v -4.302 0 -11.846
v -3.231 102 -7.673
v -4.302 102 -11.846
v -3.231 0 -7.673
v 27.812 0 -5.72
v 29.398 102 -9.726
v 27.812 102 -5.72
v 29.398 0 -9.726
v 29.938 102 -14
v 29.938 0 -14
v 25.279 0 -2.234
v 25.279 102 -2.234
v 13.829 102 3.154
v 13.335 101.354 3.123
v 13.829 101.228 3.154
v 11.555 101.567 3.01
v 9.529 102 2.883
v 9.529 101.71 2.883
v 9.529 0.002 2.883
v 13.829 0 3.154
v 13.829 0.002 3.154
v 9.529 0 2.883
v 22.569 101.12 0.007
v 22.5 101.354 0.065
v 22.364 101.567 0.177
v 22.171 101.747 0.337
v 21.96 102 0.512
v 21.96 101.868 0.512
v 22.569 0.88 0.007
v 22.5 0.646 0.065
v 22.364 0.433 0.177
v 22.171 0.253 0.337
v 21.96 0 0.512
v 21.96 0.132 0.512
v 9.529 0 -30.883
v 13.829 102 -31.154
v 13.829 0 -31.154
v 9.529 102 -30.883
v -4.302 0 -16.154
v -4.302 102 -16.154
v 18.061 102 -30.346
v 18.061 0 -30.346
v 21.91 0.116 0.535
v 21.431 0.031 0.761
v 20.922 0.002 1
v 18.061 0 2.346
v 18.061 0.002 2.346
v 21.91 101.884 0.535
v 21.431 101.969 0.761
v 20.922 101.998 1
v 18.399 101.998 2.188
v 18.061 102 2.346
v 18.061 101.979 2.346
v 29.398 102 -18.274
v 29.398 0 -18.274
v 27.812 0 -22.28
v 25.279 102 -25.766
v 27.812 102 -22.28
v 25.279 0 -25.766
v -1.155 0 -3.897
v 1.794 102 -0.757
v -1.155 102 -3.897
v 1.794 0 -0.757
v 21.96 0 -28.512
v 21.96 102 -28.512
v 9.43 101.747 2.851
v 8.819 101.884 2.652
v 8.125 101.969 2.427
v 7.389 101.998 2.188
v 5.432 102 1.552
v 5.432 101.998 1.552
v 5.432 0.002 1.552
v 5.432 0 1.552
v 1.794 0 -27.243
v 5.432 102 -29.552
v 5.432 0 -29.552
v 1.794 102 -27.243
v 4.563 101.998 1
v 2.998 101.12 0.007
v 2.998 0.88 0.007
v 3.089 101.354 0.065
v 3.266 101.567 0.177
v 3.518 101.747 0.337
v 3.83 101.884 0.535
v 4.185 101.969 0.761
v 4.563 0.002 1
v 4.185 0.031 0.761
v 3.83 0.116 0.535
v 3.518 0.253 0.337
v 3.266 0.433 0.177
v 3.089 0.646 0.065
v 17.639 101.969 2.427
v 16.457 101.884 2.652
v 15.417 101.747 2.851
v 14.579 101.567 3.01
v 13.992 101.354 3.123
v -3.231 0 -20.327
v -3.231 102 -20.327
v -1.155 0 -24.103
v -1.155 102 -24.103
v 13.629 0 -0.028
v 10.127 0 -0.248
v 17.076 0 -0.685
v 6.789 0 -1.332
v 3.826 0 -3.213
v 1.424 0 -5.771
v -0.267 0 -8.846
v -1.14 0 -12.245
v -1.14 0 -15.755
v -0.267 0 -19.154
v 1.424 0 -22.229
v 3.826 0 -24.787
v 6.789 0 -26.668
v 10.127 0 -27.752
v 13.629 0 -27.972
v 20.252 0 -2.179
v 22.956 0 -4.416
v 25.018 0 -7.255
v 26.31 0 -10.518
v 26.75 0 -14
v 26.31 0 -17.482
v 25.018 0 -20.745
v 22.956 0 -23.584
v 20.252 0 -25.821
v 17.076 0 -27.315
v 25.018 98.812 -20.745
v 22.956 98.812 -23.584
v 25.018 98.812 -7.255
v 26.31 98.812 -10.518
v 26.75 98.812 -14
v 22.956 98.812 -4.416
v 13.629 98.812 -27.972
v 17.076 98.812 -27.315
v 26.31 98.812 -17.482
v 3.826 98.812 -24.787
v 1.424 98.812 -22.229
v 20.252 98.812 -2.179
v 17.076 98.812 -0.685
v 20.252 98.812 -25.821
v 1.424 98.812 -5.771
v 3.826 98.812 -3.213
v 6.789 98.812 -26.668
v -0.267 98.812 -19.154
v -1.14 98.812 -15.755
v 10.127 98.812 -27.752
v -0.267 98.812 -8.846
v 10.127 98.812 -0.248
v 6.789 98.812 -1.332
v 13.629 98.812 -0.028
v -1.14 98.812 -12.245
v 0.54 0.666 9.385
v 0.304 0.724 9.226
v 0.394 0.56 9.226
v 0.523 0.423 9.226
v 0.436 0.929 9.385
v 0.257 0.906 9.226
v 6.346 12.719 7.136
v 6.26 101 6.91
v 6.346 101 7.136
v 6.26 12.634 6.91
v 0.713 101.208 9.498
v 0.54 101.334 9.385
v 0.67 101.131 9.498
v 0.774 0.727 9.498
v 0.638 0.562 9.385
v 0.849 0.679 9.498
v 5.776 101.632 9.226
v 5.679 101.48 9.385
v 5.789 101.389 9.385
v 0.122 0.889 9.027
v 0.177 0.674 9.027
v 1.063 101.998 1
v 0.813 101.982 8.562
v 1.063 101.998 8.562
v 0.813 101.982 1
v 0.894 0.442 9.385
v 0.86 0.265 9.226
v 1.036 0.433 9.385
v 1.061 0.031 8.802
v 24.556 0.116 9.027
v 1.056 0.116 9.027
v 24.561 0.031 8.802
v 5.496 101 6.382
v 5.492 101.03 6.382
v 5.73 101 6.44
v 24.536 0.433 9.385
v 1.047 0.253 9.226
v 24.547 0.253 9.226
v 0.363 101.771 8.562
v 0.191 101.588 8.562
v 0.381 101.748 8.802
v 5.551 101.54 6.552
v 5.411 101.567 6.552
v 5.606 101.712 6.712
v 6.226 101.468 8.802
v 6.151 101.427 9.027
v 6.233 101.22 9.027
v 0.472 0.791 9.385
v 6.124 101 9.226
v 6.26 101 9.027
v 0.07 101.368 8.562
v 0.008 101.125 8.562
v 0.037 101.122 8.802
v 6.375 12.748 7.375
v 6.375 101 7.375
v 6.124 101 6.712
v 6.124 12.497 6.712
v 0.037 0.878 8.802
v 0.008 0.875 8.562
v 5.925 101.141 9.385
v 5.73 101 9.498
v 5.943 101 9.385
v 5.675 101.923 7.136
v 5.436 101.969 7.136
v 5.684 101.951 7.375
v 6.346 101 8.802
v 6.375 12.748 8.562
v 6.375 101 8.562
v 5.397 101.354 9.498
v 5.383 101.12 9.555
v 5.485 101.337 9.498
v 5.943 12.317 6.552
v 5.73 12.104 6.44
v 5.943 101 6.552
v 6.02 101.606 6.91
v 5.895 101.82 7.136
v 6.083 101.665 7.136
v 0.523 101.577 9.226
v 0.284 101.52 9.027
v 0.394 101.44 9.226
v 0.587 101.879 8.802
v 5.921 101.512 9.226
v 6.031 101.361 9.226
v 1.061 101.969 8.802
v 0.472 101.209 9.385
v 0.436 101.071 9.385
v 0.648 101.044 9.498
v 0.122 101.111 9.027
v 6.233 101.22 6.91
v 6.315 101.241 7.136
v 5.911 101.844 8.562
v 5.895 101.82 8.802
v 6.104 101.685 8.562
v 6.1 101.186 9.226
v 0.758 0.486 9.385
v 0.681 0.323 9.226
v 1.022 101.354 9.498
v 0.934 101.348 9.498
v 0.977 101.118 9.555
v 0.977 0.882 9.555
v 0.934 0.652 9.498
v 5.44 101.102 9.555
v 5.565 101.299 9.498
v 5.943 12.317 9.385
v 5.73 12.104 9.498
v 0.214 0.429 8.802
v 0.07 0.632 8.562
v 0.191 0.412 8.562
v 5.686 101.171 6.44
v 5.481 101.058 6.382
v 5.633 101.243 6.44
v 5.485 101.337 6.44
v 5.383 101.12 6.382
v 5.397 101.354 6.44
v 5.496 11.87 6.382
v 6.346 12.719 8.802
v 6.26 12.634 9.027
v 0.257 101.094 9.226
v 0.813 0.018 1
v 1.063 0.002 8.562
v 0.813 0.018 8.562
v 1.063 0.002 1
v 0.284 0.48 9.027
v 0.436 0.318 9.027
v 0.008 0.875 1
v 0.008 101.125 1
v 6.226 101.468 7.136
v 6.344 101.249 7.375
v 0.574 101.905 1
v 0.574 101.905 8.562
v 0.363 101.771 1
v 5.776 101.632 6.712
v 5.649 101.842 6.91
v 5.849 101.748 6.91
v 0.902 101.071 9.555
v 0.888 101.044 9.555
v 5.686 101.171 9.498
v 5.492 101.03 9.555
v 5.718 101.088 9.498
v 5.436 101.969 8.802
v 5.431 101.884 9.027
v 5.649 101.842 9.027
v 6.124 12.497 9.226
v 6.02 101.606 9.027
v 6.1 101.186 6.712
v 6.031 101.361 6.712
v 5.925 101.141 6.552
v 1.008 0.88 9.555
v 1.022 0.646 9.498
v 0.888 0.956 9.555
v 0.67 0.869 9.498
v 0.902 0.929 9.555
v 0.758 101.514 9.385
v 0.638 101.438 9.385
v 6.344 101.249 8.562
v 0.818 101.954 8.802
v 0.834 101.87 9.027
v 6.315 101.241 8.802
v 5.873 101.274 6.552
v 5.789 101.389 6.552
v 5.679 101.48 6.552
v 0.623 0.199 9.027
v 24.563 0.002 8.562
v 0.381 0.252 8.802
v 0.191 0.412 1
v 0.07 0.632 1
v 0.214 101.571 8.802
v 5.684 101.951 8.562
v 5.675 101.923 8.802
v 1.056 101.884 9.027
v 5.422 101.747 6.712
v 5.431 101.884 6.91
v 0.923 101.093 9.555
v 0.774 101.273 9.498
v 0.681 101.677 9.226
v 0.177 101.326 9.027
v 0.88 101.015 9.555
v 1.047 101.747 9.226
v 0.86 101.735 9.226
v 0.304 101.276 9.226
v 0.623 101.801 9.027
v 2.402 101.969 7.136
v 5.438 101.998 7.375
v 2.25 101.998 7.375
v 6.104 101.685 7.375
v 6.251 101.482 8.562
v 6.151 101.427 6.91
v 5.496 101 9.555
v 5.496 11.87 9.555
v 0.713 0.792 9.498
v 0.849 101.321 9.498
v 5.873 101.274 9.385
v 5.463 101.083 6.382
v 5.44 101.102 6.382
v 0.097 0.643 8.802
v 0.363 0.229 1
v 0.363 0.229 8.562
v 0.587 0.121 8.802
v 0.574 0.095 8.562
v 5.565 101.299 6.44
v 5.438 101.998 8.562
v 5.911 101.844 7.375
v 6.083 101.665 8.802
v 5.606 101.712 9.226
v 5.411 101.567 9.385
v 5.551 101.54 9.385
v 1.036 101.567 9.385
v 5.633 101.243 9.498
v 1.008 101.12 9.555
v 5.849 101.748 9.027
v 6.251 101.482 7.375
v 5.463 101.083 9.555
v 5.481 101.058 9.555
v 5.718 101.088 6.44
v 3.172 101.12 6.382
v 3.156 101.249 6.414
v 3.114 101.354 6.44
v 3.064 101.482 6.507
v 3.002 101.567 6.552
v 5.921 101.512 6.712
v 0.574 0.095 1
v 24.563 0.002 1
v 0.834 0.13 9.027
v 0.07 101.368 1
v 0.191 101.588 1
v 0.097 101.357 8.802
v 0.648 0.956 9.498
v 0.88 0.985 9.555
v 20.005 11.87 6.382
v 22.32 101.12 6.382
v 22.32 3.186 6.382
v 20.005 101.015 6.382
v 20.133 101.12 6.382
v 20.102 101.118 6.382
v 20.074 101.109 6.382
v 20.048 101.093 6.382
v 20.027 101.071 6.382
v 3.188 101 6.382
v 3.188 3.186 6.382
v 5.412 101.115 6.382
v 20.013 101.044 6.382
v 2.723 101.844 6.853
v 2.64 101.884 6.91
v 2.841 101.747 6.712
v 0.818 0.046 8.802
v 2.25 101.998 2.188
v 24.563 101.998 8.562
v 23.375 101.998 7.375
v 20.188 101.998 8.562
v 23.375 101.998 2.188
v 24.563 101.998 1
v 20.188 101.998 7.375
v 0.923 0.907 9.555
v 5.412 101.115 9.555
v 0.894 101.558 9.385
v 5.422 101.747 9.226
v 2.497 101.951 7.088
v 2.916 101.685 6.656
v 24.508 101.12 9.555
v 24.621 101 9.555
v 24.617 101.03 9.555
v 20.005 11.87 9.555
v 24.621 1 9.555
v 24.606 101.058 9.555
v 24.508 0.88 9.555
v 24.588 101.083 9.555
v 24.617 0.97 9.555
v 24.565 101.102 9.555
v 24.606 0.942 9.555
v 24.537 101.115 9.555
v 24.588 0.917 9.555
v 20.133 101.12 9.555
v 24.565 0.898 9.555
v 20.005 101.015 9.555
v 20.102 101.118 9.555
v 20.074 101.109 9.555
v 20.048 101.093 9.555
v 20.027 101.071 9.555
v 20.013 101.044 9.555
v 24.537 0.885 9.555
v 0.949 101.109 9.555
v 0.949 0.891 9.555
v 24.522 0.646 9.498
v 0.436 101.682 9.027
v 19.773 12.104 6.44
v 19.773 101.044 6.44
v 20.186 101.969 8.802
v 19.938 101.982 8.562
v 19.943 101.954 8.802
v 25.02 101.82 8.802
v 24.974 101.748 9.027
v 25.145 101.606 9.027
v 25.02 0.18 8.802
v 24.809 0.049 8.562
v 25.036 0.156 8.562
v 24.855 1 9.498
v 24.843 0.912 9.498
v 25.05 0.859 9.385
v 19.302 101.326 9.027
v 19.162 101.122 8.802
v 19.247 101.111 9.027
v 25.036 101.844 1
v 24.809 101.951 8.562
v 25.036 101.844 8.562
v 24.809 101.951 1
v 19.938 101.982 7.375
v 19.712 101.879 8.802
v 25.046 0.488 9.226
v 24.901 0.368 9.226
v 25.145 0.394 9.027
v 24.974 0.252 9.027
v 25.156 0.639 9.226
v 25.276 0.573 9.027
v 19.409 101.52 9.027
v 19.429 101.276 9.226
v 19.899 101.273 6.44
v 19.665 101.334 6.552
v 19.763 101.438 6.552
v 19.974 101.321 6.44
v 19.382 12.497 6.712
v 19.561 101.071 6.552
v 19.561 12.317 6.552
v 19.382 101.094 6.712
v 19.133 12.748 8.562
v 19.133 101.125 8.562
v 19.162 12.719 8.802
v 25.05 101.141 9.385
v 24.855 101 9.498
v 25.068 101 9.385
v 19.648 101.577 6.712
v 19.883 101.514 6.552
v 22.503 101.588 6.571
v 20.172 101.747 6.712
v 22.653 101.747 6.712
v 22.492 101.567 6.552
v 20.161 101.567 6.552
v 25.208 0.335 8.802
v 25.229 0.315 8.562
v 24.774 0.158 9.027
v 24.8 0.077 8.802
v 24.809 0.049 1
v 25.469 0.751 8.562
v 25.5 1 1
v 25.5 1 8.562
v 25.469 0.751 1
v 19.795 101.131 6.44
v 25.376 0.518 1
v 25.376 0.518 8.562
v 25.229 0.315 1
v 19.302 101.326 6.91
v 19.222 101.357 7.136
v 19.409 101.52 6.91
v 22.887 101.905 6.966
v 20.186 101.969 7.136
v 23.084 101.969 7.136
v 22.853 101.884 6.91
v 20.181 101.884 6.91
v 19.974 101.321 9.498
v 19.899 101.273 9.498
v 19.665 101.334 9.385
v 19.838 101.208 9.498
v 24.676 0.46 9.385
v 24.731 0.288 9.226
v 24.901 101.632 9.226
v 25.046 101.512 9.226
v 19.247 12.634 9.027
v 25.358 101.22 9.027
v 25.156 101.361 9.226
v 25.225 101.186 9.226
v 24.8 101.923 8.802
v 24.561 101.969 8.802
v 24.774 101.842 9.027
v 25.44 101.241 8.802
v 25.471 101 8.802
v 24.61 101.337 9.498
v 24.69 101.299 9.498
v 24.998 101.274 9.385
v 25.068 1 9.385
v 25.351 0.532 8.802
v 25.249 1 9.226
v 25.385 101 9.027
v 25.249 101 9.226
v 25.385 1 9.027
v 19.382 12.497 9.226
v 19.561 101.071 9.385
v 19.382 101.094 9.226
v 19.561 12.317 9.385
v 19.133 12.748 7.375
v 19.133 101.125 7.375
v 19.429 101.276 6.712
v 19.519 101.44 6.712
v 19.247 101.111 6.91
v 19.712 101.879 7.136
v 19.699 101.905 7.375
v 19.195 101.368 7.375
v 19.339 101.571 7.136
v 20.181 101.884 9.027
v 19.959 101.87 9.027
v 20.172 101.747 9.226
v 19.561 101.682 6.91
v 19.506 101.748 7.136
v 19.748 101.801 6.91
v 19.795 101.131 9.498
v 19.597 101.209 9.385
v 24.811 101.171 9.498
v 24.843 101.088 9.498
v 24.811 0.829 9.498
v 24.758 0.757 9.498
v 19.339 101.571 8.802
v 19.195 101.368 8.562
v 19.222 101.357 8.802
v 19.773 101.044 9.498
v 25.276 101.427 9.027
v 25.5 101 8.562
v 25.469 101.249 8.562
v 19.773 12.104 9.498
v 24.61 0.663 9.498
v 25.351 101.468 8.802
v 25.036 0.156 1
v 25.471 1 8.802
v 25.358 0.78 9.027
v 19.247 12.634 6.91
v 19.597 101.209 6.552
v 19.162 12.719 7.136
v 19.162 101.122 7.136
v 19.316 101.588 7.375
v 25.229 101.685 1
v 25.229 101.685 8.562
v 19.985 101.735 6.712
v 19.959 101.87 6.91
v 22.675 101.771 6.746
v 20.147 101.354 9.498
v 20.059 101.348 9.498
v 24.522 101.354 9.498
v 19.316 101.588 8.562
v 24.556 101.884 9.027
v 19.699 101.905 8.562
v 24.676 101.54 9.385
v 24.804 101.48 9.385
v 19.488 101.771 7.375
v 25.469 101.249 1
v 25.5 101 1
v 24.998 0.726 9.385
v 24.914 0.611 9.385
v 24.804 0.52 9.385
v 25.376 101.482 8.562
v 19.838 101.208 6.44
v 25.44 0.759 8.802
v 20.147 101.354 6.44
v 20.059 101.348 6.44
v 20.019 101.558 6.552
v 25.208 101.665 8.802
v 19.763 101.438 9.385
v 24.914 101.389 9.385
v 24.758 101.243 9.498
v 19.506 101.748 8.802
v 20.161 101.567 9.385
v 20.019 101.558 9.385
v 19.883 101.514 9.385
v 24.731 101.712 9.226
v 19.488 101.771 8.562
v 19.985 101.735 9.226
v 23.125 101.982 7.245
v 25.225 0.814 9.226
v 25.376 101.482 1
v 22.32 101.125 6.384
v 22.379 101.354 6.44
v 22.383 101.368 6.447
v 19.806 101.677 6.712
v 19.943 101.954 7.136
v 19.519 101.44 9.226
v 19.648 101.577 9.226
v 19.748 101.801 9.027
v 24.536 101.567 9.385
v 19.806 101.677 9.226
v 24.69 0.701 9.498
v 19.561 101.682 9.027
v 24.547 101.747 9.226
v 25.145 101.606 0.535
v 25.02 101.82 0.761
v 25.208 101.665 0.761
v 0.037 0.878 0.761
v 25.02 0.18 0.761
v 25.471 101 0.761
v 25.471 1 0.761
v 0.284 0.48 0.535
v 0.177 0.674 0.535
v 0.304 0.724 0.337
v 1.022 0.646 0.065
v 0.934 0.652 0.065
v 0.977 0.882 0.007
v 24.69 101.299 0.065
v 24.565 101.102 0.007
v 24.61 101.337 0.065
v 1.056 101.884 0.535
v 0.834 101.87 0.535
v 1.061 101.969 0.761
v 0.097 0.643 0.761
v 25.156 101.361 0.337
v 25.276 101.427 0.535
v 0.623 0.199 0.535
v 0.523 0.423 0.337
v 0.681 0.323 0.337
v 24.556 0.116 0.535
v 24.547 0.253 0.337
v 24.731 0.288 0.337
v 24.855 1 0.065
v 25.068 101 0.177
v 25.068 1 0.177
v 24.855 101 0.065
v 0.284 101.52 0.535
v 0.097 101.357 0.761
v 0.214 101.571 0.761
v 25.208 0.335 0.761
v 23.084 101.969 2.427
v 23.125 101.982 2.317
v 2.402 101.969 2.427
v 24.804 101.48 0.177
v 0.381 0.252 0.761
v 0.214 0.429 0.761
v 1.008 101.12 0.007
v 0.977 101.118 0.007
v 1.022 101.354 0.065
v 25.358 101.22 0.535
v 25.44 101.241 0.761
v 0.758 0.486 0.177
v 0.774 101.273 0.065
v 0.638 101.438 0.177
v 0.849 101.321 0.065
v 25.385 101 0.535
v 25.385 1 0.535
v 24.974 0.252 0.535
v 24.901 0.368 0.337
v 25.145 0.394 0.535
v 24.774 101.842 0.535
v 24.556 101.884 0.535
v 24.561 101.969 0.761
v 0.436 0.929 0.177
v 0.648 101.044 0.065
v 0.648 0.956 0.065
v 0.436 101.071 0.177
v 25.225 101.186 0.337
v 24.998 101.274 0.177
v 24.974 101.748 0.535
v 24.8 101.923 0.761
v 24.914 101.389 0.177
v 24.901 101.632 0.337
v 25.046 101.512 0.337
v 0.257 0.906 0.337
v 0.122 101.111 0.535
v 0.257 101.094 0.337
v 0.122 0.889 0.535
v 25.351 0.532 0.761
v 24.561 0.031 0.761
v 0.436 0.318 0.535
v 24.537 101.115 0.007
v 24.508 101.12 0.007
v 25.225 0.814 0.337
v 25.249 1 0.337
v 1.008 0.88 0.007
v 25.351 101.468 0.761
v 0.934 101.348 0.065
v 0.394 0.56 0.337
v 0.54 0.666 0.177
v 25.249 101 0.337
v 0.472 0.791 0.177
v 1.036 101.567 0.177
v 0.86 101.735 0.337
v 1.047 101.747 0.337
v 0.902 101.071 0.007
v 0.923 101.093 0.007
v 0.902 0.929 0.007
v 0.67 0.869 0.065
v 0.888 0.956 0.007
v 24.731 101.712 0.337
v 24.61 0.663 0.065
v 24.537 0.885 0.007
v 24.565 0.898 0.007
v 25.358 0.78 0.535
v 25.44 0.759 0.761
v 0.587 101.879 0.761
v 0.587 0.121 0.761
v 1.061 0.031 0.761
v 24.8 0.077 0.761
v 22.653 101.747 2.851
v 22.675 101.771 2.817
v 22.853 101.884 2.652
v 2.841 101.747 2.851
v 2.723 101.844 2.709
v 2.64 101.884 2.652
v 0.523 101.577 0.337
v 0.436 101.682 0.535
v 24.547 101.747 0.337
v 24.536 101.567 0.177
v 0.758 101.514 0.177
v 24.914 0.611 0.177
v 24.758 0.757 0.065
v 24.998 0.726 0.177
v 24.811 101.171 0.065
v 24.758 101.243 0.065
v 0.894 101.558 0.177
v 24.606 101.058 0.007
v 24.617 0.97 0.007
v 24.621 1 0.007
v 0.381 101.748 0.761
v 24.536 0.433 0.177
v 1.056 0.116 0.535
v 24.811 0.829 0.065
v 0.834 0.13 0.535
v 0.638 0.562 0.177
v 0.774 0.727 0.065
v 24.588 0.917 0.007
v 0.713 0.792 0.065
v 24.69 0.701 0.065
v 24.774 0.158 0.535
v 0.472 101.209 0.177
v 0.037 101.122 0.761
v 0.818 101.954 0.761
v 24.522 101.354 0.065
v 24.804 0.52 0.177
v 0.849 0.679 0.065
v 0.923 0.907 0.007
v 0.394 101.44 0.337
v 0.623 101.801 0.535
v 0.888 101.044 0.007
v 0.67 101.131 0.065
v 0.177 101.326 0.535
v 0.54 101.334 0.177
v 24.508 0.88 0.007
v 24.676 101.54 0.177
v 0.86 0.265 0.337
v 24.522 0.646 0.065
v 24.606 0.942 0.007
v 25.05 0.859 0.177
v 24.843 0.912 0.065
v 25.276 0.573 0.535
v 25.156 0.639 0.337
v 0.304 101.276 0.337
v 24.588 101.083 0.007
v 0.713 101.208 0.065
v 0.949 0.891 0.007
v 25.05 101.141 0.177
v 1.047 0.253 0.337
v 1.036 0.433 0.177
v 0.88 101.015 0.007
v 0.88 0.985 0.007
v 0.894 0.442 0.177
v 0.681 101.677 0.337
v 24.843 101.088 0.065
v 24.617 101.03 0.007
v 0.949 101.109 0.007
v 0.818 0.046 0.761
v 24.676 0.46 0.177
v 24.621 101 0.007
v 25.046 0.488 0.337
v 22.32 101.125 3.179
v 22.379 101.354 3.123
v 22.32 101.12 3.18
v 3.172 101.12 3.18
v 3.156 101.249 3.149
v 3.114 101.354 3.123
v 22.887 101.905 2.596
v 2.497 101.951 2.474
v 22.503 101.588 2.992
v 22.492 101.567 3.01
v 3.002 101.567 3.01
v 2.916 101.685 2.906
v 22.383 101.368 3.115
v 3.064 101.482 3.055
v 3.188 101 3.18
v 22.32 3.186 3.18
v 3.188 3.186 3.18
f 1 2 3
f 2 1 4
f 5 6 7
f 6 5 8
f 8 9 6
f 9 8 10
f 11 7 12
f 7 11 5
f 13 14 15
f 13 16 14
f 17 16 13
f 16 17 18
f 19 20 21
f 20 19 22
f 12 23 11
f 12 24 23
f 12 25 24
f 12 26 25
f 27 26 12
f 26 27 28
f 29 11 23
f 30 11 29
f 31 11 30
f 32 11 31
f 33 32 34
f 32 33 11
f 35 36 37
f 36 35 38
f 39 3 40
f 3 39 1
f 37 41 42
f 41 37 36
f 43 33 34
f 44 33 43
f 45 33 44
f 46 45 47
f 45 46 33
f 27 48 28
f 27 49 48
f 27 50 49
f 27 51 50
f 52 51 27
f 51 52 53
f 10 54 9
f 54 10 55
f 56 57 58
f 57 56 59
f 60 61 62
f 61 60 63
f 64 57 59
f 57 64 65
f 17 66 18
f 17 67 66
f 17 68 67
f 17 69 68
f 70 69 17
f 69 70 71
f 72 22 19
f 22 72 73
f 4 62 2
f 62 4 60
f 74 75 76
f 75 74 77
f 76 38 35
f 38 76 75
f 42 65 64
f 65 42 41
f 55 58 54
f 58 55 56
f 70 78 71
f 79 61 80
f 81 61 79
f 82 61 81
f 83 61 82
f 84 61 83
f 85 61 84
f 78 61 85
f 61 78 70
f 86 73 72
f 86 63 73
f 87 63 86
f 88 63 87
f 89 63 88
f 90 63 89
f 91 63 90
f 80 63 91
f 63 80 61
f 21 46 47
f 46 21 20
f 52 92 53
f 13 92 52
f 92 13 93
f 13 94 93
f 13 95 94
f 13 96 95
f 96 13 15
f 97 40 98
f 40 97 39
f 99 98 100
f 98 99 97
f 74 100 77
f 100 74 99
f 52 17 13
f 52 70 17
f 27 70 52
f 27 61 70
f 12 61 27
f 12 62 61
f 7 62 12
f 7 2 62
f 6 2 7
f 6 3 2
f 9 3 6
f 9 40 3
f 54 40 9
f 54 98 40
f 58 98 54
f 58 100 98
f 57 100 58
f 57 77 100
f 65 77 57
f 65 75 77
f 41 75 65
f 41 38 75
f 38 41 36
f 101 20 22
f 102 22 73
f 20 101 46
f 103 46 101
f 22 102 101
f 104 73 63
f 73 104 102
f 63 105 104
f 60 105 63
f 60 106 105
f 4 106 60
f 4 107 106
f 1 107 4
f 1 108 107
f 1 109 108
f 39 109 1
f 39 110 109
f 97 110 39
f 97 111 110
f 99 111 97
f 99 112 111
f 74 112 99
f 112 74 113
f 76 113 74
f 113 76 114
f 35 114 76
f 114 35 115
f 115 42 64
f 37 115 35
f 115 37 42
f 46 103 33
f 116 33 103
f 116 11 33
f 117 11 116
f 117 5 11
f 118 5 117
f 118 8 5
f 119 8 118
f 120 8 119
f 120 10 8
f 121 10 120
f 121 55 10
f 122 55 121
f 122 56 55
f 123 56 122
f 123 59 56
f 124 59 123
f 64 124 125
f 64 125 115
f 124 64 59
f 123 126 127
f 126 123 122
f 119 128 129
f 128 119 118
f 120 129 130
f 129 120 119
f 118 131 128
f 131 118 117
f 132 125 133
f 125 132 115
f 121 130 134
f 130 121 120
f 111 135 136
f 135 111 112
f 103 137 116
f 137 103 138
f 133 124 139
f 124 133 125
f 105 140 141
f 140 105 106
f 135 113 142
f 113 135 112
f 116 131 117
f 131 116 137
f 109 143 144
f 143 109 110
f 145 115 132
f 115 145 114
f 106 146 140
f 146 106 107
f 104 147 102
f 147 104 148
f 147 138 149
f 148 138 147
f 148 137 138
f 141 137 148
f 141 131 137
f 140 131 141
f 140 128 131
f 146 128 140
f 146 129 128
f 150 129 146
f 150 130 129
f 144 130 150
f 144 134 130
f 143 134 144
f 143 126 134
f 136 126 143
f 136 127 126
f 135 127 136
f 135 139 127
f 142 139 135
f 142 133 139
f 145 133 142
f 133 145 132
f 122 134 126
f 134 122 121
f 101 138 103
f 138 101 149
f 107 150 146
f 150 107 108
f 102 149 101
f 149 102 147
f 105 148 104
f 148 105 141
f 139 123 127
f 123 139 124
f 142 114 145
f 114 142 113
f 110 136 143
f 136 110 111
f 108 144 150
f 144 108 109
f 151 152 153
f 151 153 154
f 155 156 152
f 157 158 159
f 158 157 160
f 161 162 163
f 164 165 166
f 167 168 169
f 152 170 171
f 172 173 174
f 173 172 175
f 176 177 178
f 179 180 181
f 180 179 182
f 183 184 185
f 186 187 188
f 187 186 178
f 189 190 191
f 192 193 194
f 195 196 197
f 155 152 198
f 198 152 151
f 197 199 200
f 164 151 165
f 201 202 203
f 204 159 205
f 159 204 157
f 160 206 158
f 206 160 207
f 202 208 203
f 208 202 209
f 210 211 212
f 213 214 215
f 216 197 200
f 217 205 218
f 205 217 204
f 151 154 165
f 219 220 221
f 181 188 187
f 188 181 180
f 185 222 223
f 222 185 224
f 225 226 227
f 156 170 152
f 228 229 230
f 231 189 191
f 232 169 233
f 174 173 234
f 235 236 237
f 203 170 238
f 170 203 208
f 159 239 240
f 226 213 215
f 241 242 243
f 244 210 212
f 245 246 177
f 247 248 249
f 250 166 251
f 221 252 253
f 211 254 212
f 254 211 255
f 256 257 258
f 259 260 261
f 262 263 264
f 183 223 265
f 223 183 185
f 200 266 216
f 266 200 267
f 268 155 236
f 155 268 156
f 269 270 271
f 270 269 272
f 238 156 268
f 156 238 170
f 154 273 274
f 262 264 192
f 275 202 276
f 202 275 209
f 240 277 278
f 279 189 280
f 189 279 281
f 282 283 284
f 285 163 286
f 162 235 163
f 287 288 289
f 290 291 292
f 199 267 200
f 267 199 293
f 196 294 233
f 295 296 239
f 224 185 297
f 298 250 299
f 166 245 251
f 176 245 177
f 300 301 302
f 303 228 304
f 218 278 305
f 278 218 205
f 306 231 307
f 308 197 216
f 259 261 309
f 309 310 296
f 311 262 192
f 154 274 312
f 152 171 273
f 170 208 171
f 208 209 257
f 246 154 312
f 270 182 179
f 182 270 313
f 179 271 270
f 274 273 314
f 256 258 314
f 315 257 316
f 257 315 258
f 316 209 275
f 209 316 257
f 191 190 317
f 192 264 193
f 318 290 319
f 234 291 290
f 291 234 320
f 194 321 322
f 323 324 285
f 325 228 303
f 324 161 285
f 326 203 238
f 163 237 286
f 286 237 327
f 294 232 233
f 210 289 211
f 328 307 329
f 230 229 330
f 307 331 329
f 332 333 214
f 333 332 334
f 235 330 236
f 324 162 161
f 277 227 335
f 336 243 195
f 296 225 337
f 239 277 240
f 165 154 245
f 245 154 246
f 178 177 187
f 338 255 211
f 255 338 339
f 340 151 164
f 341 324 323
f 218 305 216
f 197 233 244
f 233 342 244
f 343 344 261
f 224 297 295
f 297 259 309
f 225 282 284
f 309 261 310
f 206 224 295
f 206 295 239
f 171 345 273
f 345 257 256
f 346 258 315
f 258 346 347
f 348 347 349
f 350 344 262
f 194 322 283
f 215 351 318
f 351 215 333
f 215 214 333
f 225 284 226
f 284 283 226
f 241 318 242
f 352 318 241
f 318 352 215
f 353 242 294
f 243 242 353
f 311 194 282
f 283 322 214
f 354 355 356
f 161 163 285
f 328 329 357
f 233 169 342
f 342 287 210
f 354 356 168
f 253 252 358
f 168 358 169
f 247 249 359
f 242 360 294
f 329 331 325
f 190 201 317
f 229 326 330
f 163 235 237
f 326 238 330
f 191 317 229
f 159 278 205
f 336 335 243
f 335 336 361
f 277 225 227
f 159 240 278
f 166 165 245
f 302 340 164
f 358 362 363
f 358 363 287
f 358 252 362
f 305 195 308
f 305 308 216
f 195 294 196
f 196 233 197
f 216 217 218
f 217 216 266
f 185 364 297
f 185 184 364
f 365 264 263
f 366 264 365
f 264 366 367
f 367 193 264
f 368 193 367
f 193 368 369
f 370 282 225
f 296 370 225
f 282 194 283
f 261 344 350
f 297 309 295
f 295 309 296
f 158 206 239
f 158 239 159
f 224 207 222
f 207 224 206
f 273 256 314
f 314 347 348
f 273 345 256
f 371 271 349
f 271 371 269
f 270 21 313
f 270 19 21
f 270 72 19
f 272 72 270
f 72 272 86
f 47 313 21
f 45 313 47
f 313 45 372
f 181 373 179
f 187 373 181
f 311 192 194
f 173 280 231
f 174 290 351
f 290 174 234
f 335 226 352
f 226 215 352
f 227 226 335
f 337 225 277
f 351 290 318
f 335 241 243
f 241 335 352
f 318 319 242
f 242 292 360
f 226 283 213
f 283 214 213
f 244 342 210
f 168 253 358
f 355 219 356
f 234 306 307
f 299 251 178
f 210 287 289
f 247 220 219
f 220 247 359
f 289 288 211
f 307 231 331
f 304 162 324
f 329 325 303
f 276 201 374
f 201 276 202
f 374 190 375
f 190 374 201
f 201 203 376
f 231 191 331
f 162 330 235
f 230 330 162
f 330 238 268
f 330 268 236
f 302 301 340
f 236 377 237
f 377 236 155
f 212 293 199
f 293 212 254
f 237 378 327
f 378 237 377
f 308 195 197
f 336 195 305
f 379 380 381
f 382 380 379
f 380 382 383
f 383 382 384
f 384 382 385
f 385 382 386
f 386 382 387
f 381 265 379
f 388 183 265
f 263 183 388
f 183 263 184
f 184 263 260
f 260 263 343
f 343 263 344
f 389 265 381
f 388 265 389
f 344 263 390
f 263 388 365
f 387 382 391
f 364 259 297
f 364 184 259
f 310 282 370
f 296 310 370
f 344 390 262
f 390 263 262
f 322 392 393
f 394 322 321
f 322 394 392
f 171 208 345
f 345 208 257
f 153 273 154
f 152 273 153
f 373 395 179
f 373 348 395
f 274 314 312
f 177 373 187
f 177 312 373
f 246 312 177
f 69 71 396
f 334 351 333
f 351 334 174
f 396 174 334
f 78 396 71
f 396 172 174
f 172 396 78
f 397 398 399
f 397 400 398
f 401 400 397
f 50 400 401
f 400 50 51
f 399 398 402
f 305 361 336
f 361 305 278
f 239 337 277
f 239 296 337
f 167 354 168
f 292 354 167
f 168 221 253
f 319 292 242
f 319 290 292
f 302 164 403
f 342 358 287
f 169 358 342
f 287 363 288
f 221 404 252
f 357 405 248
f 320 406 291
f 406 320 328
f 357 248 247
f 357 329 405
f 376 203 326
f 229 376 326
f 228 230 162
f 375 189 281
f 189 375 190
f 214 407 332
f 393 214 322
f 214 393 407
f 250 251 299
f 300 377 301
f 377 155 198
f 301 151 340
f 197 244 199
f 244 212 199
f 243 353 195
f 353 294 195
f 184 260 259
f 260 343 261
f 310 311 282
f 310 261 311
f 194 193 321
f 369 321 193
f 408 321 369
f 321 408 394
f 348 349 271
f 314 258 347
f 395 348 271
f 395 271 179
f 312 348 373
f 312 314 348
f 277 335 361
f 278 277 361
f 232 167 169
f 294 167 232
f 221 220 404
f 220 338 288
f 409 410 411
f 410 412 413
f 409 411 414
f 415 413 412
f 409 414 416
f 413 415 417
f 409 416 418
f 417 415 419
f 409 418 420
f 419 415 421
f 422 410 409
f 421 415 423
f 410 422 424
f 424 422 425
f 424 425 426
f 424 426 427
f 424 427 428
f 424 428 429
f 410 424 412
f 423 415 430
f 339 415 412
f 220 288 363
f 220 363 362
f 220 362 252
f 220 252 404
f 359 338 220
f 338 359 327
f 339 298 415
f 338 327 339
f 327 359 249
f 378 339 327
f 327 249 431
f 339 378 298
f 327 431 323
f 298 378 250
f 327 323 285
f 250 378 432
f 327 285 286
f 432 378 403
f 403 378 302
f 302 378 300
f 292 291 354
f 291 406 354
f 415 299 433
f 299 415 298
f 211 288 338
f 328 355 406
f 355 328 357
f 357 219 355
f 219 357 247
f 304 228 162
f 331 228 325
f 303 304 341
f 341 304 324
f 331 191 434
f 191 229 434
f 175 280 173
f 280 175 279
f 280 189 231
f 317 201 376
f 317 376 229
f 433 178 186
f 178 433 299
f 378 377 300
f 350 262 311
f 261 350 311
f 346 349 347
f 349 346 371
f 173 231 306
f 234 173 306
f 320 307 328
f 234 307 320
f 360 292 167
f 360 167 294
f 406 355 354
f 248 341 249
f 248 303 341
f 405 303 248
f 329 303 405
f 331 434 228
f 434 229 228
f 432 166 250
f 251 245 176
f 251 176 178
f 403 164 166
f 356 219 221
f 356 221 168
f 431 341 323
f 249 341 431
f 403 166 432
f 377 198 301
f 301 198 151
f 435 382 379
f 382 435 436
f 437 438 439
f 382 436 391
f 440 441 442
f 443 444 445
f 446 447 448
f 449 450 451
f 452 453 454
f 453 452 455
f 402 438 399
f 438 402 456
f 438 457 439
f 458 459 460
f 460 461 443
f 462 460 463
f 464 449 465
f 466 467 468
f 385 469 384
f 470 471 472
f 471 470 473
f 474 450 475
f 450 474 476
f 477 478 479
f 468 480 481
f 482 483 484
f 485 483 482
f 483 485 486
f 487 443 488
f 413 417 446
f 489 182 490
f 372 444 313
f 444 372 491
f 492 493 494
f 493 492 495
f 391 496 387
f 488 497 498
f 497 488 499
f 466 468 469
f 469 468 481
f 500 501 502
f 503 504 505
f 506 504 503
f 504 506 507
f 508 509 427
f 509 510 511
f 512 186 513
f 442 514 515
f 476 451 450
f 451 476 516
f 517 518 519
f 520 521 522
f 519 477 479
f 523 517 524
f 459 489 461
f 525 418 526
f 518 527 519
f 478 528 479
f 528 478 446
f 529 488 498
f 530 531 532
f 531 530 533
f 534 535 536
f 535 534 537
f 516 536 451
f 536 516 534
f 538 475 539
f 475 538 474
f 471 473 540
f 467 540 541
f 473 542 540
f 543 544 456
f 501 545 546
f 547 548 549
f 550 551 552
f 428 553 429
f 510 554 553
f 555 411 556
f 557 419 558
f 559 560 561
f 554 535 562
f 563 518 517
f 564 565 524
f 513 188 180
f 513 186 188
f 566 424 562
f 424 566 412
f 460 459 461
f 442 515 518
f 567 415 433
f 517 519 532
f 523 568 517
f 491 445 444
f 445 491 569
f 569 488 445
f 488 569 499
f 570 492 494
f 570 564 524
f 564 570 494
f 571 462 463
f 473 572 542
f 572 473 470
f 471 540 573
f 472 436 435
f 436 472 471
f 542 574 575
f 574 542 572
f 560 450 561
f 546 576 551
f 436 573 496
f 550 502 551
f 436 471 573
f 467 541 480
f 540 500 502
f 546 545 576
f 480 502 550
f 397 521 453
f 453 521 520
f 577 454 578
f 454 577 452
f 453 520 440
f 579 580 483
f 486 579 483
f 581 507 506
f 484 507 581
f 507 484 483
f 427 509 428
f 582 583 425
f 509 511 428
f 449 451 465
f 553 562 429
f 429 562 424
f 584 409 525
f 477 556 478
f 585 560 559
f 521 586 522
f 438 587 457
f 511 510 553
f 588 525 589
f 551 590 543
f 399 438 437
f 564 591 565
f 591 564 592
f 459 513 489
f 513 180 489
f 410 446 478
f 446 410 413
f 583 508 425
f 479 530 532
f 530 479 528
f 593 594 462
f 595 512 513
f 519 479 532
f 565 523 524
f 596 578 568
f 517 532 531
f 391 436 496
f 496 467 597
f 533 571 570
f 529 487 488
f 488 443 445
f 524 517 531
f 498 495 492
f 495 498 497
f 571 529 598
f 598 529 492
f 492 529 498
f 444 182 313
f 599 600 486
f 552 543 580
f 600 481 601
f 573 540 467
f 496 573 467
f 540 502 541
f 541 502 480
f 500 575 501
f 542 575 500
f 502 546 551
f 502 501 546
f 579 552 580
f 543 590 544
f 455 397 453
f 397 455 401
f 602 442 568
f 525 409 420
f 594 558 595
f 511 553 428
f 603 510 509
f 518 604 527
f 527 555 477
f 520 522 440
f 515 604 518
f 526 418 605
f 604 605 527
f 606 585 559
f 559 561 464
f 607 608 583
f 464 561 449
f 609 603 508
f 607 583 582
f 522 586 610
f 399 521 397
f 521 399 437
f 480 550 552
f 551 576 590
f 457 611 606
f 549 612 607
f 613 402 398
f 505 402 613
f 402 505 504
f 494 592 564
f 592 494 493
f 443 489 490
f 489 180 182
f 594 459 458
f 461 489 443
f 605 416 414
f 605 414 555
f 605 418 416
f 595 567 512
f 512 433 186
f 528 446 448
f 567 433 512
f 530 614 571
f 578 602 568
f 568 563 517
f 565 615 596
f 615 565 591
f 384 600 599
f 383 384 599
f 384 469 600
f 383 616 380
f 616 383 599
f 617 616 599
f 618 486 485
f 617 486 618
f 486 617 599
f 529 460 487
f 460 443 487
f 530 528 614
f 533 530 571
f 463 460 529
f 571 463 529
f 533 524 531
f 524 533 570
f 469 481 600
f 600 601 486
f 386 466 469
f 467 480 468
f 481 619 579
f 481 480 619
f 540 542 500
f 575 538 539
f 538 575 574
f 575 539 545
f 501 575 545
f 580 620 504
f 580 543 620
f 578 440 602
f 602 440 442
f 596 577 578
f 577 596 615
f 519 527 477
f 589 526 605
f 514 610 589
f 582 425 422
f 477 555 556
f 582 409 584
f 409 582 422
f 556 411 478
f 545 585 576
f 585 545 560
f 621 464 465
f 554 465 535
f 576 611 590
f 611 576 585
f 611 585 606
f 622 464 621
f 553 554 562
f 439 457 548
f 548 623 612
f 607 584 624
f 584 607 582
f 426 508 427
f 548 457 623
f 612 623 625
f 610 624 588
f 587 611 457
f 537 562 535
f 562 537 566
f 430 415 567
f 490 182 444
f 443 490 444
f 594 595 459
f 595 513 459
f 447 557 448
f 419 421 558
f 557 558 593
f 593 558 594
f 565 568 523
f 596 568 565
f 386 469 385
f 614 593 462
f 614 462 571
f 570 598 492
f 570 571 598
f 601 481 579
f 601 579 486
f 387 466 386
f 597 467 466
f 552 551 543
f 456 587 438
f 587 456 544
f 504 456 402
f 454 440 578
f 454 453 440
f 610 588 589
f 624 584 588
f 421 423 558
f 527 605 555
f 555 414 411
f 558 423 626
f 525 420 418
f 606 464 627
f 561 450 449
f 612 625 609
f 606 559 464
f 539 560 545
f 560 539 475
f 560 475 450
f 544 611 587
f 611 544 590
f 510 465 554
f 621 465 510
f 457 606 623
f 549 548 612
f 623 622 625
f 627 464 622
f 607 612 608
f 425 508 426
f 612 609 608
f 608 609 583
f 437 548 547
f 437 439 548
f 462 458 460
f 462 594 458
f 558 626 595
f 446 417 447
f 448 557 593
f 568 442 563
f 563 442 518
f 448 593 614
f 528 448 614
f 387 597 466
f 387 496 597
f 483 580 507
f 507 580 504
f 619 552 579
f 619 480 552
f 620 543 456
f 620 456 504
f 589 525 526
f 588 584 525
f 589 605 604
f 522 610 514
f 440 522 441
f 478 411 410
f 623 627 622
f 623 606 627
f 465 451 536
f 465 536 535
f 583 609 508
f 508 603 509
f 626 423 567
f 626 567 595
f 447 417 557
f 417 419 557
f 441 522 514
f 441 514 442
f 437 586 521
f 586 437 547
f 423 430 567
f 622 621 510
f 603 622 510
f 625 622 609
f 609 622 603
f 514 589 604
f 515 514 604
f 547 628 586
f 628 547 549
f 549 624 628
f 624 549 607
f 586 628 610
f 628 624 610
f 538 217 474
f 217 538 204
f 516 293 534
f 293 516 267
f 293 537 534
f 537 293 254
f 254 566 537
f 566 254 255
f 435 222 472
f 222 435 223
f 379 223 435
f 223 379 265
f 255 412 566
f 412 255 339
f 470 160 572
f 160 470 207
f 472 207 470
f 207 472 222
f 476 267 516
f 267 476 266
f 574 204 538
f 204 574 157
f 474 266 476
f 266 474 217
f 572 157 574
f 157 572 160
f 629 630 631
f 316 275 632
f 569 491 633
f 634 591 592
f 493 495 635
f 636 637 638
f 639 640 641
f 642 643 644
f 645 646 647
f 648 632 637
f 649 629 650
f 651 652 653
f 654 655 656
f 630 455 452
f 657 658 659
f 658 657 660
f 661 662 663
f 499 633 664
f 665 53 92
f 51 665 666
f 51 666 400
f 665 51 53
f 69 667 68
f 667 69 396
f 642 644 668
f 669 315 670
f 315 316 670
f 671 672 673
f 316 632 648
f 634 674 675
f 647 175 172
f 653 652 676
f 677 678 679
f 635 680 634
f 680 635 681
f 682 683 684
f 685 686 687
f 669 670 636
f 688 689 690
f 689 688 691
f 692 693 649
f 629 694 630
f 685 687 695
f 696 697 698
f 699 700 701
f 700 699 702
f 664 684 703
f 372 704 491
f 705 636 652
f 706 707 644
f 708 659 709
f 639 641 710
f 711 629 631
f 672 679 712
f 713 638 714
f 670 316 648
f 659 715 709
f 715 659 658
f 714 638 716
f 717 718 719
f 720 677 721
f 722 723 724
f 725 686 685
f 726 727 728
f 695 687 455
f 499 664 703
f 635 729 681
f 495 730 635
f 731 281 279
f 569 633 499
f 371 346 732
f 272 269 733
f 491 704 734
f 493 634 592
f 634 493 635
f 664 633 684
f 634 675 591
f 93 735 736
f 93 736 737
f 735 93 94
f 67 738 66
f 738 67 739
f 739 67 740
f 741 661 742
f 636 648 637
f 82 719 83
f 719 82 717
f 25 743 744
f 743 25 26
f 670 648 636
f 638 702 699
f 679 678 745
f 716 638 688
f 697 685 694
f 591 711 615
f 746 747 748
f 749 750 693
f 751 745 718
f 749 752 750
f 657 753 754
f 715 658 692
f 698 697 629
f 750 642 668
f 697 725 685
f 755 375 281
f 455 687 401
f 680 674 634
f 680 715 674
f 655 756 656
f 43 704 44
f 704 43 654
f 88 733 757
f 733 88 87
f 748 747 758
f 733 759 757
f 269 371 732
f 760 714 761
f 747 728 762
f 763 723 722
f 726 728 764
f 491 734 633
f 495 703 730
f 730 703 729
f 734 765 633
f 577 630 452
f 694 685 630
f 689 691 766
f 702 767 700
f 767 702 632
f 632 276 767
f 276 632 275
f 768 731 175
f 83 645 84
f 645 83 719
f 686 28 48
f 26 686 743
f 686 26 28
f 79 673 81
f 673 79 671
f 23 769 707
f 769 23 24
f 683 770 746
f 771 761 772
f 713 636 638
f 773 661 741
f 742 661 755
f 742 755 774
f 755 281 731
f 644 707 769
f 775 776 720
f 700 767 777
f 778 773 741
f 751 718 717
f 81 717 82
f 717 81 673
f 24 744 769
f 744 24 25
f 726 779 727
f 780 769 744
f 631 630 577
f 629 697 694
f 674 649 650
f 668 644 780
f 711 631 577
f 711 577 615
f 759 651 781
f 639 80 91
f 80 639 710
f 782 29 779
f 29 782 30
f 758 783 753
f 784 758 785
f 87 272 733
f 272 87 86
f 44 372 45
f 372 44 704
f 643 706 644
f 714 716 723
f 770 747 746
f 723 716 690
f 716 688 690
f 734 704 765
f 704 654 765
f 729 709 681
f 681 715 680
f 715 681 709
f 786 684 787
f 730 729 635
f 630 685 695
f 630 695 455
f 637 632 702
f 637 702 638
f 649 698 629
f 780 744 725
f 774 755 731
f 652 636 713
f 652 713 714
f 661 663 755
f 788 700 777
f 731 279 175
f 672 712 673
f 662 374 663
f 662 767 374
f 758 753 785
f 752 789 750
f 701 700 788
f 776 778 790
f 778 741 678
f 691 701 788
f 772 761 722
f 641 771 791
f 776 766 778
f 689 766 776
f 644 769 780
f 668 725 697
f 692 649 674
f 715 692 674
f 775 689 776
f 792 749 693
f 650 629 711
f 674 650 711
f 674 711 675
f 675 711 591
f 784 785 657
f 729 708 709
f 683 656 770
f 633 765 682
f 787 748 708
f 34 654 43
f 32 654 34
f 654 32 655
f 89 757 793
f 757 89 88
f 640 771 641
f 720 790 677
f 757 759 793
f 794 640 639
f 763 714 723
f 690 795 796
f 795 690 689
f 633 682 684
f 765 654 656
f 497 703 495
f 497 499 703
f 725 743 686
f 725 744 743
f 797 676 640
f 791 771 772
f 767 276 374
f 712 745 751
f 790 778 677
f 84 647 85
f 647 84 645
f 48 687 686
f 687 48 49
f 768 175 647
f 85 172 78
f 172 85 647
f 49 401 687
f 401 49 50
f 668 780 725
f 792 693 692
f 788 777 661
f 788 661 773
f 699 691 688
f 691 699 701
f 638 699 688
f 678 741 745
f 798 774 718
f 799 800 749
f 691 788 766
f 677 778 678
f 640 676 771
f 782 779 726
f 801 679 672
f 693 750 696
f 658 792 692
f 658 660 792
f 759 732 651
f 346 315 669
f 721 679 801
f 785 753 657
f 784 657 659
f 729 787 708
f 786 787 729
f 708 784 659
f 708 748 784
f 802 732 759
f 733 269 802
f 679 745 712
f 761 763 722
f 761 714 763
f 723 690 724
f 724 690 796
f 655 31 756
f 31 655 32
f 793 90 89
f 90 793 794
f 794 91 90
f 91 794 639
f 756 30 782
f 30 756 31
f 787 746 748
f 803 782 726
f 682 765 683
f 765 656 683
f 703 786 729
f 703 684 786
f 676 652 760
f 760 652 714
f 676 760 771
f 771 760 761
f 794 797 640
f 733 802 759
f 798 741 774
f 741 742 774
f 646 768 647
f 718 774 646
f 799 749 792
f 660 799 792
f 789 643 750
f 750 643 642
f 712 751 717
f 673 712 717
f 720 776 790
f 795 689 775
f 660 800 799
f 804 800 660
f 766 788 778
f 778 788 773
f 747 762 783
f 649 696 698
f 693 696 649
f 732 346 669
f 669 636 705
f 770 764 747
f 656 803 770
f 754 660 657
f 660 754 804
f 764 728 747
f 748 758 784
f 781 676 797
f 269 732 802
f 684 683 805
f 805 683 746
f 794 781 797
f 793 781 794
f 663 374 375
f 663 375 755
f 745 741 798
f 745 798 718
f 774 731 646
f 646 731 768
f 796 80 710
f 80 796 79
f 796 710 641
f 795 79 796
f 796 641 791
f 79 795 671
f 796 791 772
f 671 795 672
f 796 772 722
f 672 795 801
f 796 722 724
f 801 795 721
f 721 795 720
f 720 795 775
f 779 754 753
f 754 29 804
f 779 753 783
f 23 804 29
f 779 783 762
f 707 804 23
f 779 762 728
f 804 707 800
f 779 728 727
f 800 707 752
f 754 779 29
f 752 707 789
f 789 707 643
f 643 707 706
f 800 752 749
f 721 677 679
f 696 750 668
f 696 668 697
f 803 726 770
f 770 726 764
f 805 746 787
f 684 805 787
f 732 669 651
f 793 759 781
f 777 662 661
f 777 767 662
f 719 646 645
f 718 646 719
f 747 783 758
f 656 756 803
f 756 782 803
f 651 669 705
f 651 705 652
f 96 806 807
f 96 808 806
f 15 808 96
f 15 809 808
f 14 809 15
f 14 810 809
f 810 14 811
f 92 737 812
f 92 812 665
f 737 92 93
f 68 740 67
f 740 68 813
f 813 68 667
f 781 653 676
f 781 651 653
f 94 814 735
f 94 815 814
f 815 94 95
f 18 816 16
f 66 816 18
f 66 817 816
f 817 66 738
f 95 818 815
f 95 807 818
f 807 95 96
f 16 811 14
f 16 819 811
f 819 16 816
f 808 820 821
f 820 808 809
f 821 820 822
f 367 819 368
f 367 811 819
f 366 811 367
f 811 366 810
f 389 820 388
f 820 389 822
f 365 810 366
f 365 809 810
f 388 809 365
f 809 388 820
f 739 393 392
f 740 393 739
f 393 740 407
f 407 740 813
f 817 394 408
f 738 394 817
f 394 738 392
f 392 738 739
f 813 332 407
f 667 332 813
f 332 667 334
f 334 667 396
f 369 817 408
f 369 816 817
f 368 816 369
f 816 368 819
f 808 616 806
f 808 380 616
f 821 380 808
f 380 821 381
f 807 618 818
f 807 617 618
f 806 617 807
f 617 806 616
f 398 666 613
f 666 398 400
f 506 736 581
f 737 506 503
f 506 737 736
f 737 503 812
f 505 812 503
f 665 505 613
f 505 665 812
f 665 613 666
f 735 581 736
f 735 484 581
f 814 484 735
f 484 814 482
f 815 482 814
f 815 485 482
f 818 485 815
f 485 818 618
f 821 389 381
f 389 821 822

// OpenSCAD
// file: lib/cover.scad
//fine = true; 
fine = false; 

$fn = fine ? 100 : 25;

roundcorner = 2; 

horn_arc = 45;

horn_diameter = 5;

base_size = 25.5;
plate_thickness = base_size / 8;




module bar(roundcorner = 1, x = base_size, y = base_size, z = plate_thickness, color = "purple") {
    translate([roundcorner, roundcorner, roundcorner]) {
        color(color) {
            minkowski() {
                cube([x - (roundcorner * 2), y - (roundcorner * 2), z - (roundcorner * 2)]);
                sphere(d = roundcorner * 2);
            }
        }
    }
}



    
module cover(x_ness = 1, y_ness = 1) {

    // base plate
    bar(x = base_size * x_ness, y = base_size * y_ness, z = plate_thickness);

    // sides
    bar(color = "green", x = plate_thickness, y = base_size * y_ness, z = plate_thickness * 3);
    translate([(base_size * x_ness) - plate_thickness, 0, 0]) 
        bar(color = "red", x = plate_thickness, y = base_size * y_ness, z = plate_thickness * 3);
    bar(color = "blue", x = base_size * x_ness, y = plate_thickness, z = plate_thickness * 3);
    
    // cover
    translate([0, 0, plate_thickness * 2]) {
        bar(color = "grey", x = plate_thickness * 2, y = base_size * y_ness);
        translate([(base_size * x_ness) - (plate_thickness * 2), 0, 0]) 
            bar(color = "black", x = plate_thickness * 2, y = base_size * y_ness);
        bar(color = "white", x = base_size * x_ness, y = plate_thickness * y_ness);

    }

}
// main file
//fine = true;
fine = false;

$fn = fine ? 100 : 25;

roundcorner = 2;

horn_arc = 45;

horn_diameter = 5;

base_size = 25.5;
plate_thickness = base_size / 8;


module pad() {
    color("orange")
    translate([((base_size / 8) * 2) + (roundcorner / 2), ((base_size / 8) * 2) + (roundcorner / 2), roundcorner / 2]) {
        minkowski() {
            cube([((base_size / 8) * 4) - roundcorner, ((base_size / 8) * 4) - roundcorner, (2 * plate_thickness) - roundcorner]);
            sphere(d = roundcorner);
        }
    }



    translate([base_size / 2, base_size / 2, 2 * plate_thickness])

    translate([10, 0, 0]){
        color("green") rotate([90, 180 + 45, 0]) {
            rotate_extrude(angle=horn_arc) {
                translate([10, 0]) {
                    circle(d = horn_diameter);
                }
            }
            translate([10,0, 0]) {
                color("purple") sphere(d = horn_diameter);
            }
        }
    }

}


module base() {
    color("purple")
    translate([((base_size / 8) * 1) + (roundcorner / 2), ((base_size / 8) * 1) + (roundcorner / 2), (roundcorner / 2)]) {
        minkowski() {
            cube([((base_size / 8) * 6) - roundcorner, ((base_size / 8) * 6) - roundcorner, plate_thickness - roundcorner]);
            sphere(d = roundcorner);
        }
    }
}

module plate() {
    color("red")
    translate([((base_size / 8) * 0) + (roundcorner / 2), ((base_size / 8) * 0) + (roundcorner / 2), (roundcorner / 2)]) {
        minkowski() {
            cube([((base_size / 8) * 8) - roundcorner, ((base_size / 8) * 8) - roundcorner, plate_thickness - roundcorner]);
            sphere(d = roundcorner);
        }
    }
}
module plate2() {
    color("red")
    translate([((base_size / 8) * 0) + (roundcorner / 2), ((base_size / 8) * 0) + (roundcorner / 2), (roundcorner / 2)]) {
        minkowski() {
            cube([((base_size / 8) * 8) - roundcorner, ((base_size / 8) * 8 * 2) - roundcorner, plate_thickness - roundcorner]);
            sphere(d = roundcorner);
        }
    }
}

module rail() {
    color("grey") translate([((base_size / 8) * 0) + (roundcorner / 2), ((base_size / 8) * 0) + (roundcorner / 2), (roundcorner / 2)]) {
        minkowski() {
            cube([((base_size / 8) * 1) - roundcorner, ((base_size / 8) * 8) - roundcorner, (plate_thickness * 3) - roundcorner]);
            sphere(d = roundcorner);
        }
    }
    color("orange") translate([((base_size / 8) * 0) + (roundcorner / 2), ((base_size / 8) * 0) + (roundcorner / 2), (plate_thickness * 2)+ (roundcorner / 2)]) {
        minkowski() {
            cube([((base_size / 8) * 2) - roundcorner, ((base_size / 8) * 8) - roundcorner, (plate_thickness * 1) - roundcorner]);
            sphere(d = roundcorner);
        }
    }


    color("grey") translate([((base_size / 8) * 0) + (roundcorner / 2), ((base_size / 8) * 0) + (roundcorner / 2), (roundcorner / 2)]) {
        minkowski() {
            cube([((base_size / 8) * 8) - roundcorner, ((base_size / 8) * 1) - roundcorner, (plate_thickness * 3) - roundcorner]);
            sphere(d = roundcorner);
        }
    }
    color("orange") translate([((base_size / 8) * 6) + (roundcorner / 2), ((base_size / 8) * 0) + (roundcorner / 2), (plate_thickness * 2) + (roundcorner / 2)]) {
        minkowski() {
            cube([((base_size / 8) * 2) - roundcorner, ((base_size / 8) * 8) - roundcorner, (plate_thickness * 1) - roundcorner]);
            sphere(d = roundcorner);
        }
    }



    color("grey") translate([((base_size / 8) * 7) + (roundcorner / 2), ((base_size / 8) * 0) + (roundcorner / 2), (roundcorner / 2)]) {
        minkowski() {
            cube([((base_size / 8) * 1) - roundcorner, ((base_size / 8) * 8) - roundcorner, (plate_thickness * 3) - roundcorner]);
            sphere(d = roundcorner);
        }
    }
        color("orange") translate([((base_size / 8) * 0) + (roundcorner / 2), ((base_size / 8) * 0) + (roundcorner / 2), (plate_thickness * 2) + (roundcorner / 2)]) {
        minkowski() {
            cube([((base_size / 8) * 8) - roundcorner, ((base_size / 8) * 2) - roundcorner, (plate_thickness * 1) - roundcorner]);
            sphere(d = roundcorner);
        }
    }
}



module rail2() {
    color("grey") translate([((base_size / 8) * 0) + (roundcorner / 2), ((base_size / 8) * 0) + (roundcorner / 2), (roundcorner / 2)]) {
        minkowski() {
            cube([((base_size / 8) * 1) - roundcorner, ((base_size / 8) * 8 *2) - roundcorner, (plate_thickness * 3) - roundcorner]);
            sphere(d = roundcorner);
        }
    }
    color("orange") translate([((base_size / 8) * 0) + (roundcorner / 2), ((base_size / 8) * 0) + (roundcorner / 2), (plate_thickness * 2)+ (roundcorner / 2)]) {
        minkowski() {
            cube([((base_size / 8) * 2) - roundcorner, ((base_size / 8) * 8 * 2) - roundcorner, (plate_thickness * 1) - roundcorner]);
            sphere(d = roundcorner);
        }
    }


    color("grey") translate([((base_size / 8) * 0) + (roundcorner / 2), ((base_size / 8) * 0) + (roundcorner / 2), (roundcorner / 2)]) {
        minkowski() {
            cube([((base_size / 8) * 8) - roundcorner, ((base_size / 8) * 1) - roundcorner, (plate_thickness * 3) - roundcorner]);
            sphere(d = roundcorner);
        }
    }
    color("orange") translate([((base_size / 8) * 6) + (roundcorner / 2), ((base_size / 8) * 0) + (roundcorner / 2), (plate_thickness * 2) + (roundcorner / 2)]) {
        minkowski() {
            cube([((base_size / 8) * 2) - roundcorner, ((base_size / 8) * 8 * 2) - roundcorner, (plate_thickness * 1) - roundcorner]);
            sphere(d = roundcorner);
        }
    }



    color("grey") translate([((base_size / 8) * 7) + (roundcorner / 2), ((base_size / 8) * 0) + (roundcorner / 2), (roundcorner / 2)]) {
        minkowski() {
            cube([((base_size / 8) * 1) - roundcorner, ((base_size / 8) * 8 * 2) - roundcorner, (plate_thickness * 3) - roundcorner]);
            sphere(d = roundcorner);
        }
    }
        color("orange") translate([((base_size / 8) * 0) + (roundcorner / 2), ((base_size / 8) * 0) + (roundcorner / 2), (plate_thickness * 2) + (roundcorner / 2)]) {
        minkowski() {
            cube([((base_size / 8) * 8) - roundcorner, ((base_size / 8) * 2) - roundcorner, (plate_thickness * 1) - roundcorner]);
            sphere(d = roundcorner);
        }
    }
}




module base3() {
    color("blue") hull() {
        base();
        translate([0, base_size, 0]) base();
    }
}

//pad();
//translate([0, base_size, 0]) pad();
//base2();
//base3();

use <lib/cover.scad>;


//plate2();
//rail2();

//tube_id = (base_size / 2) + 1;
tube_id = 28;
tube_od = tube_id + (plate_thickness * 2);

translate([base_size / 2, base_size * 4, - ((tube_od / 2) - plate_thickness)] ) {
    rotate([90, 0, 0]) {
        difference() {
            cylinder(d = tube_od, h = base_size * 4);
            translate([0, 0, plate_thickness + 0.001])
                cylinder(d = tube_id, h = (base_size * 4) - plate_thickness);
        }
    }
}

cover(1,4, 0.1);
